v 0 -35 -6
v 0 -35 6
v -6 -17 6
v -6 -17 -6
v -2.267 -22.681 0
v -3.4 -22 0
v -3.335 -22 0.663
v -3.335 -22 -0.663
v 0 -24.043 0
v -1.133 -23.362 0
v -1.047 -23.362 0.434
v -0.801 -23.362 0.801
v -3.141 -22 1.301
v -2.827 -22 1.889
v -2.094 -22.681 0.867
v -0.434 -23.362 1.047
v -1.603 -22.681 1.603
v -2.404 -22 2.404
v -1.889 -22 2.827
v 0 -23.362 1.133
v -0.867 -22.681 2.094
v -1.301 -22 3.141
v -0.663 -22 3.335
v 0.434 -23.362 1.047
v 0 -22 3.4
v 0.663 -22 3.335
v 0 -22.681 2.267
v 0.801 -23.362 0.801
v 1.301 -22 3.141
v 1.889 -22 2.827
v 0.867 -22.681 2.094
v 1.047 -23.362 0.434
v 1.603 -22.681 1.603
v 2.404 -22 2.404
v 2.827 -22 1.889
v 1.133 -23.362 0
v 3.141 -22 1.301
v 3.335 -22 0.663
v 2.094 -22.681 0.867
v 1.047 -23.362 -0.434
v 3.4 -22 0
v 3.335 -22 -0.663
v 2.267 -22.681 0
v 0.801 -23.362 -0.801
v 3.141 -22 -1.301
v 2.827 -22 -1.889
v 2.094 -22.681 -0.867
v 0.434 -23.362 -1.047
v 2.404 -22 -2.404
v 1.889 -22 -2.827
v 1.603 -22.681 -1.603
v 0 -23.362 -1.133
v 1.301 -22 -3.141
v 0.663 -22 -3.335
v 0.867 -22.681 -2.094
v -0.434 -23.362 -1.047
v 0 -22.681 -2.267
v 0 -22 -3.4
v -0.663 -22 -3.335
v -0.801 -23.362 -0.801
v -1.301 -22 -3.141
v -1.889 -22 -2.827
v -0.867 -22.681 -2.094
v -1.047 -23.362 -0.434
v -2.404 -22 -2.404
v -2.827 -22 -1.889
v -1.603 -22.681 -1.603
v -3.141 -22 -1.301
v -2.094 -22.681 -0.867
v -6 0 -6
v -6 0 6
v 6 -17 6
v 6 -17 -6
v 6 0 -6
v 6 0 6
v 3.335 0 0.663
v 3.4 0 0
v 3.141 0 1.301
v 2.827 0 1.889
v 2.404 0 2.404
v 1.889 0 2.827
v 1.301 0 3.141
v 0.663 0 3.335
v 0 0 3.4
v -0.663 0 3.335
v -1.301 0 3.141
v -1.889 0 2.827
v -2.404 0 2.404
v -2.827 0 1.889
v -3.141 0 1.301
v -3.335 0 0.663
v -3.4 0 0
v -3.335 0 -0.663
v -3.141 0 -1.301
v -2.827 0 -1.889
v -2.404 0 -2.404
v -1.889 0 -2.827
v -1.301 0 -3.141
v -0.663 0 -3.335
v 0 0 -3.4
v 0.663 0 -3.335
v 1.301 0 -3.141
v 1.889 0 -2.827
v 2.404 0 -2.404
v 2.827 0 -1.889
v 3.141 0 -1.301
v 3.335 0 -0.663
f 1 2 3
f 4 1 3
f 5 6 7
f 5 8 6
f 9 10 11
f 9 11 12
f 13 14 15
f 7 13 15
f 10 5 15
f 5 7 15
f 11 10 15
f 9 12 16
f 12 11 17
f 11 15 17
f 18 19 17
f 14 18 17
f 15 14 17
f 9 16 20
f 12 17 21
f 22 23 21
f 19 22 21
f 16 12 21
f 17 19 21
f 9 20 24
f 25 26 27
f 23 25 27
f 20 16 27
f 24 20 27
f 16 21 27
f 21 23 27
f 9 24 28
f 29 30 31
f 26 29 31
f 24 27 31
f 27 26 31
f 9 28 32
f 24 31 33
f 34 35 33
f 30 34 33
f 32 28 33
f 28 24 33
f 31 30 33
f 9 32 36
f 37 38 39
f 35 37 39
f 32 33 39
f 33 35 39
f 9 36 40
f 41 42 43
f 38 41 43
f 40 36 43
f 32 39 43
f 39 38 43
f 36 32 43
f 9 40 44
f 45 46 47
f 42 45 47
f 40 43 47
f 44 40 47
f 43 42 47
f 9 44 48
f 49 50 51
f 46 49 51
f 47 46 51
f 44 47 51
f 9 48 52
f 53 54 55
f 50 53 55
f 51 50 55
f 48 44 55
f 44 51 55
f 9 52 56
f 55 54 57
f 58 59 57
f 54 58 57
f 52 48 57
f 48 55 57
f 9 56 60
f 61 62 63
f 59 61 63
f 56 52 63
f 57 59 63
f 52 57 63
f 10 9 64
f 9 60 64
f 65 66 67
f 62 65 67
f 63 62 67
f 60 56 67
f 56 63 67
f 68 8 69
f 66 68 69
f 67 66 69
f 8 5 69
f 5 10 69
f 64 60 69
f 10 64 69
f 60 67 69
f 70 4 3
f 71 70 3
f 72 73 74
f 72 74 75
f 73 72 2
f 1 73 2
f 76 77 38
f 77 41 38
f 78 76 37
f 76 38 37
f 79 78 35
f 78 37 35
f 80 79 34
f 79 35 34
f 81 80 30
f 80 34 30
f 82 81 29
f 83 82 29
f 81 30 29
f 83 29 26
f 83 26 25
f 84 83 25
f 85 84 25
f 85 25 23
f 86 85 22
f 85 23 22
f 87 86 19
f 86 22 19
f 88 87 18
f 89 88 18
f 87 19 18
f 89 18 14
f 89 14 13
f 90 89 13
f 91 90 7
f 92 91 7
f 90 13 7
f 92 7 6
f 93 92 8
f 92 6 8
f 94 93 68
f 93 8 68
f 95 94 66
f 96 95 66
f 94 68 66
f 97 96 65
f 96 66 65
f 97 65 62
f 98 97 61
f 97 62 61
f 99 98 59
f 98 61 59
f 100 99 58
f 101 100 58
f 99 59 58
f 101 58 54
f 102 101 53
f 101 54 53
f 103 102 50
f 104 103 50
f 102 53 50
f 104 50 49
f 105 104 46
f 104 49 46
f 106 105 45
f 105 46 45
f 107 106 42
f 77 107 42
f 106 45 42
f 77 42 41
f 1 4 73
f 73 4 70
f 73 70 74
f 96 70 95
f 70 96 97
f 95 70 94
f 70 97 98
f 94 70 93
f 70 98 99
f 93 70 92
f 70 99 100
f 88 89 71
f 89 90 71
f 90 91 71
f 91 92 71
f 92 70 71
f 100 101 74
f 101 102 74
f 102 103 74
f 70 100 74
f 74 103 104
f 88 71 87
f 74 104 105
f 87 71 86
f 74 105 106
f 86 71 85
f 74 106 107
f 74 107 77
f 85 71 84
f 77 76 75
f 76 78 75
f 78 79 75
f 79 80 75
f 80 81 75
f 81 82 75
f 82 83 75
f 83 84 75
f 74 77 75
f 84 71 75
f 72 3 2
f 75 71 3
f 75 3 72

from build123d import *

# Parameters (mm, degrees)
F0_W     = 12
F0_H     = 12
F1_DEPTH = 35
F3_DEPTH = 25
F5_D     = 6.8
F5_DEPTH = 22
F5_TIP   = 2.0429261047


with BuildPart() as f1:
    # F0 (on Front) → F1 (new body)
    with BuildSketch(Plane.XZ):
        Rectangle(F0_W, F0_H)
    extrude(amount=F1_DEPTH)

    # F2 (on face) → F3 (cut)
    with BuildSketch(Plane.XY.offset(6)):
        Polygon((-6, -35), (0, -35), (-6, -17), align=None)
        Polygon((6, -17), (0, -35), (6, -35), align=None)
    extrude(amount=-F3_DEPTH, mode=Mode.SUBTRACT)

    # F5
    with Locations(Plane(origin=(0, 0, 0), x_dir=(-1, 0, 0), z_dir=(0, 1, 0))):
        with Locations((0, 0)):
            Hole(F5_D / 2, depth=F5_DEPTH)
            with Locations((0, 0, -(F5_DEPTH + F5_TIP / 2))):  # 118° drill point
                Cone(0, F5_D / 2, F5_TIP, mode=Mode.SUBTRACT)


solid = f1.part
